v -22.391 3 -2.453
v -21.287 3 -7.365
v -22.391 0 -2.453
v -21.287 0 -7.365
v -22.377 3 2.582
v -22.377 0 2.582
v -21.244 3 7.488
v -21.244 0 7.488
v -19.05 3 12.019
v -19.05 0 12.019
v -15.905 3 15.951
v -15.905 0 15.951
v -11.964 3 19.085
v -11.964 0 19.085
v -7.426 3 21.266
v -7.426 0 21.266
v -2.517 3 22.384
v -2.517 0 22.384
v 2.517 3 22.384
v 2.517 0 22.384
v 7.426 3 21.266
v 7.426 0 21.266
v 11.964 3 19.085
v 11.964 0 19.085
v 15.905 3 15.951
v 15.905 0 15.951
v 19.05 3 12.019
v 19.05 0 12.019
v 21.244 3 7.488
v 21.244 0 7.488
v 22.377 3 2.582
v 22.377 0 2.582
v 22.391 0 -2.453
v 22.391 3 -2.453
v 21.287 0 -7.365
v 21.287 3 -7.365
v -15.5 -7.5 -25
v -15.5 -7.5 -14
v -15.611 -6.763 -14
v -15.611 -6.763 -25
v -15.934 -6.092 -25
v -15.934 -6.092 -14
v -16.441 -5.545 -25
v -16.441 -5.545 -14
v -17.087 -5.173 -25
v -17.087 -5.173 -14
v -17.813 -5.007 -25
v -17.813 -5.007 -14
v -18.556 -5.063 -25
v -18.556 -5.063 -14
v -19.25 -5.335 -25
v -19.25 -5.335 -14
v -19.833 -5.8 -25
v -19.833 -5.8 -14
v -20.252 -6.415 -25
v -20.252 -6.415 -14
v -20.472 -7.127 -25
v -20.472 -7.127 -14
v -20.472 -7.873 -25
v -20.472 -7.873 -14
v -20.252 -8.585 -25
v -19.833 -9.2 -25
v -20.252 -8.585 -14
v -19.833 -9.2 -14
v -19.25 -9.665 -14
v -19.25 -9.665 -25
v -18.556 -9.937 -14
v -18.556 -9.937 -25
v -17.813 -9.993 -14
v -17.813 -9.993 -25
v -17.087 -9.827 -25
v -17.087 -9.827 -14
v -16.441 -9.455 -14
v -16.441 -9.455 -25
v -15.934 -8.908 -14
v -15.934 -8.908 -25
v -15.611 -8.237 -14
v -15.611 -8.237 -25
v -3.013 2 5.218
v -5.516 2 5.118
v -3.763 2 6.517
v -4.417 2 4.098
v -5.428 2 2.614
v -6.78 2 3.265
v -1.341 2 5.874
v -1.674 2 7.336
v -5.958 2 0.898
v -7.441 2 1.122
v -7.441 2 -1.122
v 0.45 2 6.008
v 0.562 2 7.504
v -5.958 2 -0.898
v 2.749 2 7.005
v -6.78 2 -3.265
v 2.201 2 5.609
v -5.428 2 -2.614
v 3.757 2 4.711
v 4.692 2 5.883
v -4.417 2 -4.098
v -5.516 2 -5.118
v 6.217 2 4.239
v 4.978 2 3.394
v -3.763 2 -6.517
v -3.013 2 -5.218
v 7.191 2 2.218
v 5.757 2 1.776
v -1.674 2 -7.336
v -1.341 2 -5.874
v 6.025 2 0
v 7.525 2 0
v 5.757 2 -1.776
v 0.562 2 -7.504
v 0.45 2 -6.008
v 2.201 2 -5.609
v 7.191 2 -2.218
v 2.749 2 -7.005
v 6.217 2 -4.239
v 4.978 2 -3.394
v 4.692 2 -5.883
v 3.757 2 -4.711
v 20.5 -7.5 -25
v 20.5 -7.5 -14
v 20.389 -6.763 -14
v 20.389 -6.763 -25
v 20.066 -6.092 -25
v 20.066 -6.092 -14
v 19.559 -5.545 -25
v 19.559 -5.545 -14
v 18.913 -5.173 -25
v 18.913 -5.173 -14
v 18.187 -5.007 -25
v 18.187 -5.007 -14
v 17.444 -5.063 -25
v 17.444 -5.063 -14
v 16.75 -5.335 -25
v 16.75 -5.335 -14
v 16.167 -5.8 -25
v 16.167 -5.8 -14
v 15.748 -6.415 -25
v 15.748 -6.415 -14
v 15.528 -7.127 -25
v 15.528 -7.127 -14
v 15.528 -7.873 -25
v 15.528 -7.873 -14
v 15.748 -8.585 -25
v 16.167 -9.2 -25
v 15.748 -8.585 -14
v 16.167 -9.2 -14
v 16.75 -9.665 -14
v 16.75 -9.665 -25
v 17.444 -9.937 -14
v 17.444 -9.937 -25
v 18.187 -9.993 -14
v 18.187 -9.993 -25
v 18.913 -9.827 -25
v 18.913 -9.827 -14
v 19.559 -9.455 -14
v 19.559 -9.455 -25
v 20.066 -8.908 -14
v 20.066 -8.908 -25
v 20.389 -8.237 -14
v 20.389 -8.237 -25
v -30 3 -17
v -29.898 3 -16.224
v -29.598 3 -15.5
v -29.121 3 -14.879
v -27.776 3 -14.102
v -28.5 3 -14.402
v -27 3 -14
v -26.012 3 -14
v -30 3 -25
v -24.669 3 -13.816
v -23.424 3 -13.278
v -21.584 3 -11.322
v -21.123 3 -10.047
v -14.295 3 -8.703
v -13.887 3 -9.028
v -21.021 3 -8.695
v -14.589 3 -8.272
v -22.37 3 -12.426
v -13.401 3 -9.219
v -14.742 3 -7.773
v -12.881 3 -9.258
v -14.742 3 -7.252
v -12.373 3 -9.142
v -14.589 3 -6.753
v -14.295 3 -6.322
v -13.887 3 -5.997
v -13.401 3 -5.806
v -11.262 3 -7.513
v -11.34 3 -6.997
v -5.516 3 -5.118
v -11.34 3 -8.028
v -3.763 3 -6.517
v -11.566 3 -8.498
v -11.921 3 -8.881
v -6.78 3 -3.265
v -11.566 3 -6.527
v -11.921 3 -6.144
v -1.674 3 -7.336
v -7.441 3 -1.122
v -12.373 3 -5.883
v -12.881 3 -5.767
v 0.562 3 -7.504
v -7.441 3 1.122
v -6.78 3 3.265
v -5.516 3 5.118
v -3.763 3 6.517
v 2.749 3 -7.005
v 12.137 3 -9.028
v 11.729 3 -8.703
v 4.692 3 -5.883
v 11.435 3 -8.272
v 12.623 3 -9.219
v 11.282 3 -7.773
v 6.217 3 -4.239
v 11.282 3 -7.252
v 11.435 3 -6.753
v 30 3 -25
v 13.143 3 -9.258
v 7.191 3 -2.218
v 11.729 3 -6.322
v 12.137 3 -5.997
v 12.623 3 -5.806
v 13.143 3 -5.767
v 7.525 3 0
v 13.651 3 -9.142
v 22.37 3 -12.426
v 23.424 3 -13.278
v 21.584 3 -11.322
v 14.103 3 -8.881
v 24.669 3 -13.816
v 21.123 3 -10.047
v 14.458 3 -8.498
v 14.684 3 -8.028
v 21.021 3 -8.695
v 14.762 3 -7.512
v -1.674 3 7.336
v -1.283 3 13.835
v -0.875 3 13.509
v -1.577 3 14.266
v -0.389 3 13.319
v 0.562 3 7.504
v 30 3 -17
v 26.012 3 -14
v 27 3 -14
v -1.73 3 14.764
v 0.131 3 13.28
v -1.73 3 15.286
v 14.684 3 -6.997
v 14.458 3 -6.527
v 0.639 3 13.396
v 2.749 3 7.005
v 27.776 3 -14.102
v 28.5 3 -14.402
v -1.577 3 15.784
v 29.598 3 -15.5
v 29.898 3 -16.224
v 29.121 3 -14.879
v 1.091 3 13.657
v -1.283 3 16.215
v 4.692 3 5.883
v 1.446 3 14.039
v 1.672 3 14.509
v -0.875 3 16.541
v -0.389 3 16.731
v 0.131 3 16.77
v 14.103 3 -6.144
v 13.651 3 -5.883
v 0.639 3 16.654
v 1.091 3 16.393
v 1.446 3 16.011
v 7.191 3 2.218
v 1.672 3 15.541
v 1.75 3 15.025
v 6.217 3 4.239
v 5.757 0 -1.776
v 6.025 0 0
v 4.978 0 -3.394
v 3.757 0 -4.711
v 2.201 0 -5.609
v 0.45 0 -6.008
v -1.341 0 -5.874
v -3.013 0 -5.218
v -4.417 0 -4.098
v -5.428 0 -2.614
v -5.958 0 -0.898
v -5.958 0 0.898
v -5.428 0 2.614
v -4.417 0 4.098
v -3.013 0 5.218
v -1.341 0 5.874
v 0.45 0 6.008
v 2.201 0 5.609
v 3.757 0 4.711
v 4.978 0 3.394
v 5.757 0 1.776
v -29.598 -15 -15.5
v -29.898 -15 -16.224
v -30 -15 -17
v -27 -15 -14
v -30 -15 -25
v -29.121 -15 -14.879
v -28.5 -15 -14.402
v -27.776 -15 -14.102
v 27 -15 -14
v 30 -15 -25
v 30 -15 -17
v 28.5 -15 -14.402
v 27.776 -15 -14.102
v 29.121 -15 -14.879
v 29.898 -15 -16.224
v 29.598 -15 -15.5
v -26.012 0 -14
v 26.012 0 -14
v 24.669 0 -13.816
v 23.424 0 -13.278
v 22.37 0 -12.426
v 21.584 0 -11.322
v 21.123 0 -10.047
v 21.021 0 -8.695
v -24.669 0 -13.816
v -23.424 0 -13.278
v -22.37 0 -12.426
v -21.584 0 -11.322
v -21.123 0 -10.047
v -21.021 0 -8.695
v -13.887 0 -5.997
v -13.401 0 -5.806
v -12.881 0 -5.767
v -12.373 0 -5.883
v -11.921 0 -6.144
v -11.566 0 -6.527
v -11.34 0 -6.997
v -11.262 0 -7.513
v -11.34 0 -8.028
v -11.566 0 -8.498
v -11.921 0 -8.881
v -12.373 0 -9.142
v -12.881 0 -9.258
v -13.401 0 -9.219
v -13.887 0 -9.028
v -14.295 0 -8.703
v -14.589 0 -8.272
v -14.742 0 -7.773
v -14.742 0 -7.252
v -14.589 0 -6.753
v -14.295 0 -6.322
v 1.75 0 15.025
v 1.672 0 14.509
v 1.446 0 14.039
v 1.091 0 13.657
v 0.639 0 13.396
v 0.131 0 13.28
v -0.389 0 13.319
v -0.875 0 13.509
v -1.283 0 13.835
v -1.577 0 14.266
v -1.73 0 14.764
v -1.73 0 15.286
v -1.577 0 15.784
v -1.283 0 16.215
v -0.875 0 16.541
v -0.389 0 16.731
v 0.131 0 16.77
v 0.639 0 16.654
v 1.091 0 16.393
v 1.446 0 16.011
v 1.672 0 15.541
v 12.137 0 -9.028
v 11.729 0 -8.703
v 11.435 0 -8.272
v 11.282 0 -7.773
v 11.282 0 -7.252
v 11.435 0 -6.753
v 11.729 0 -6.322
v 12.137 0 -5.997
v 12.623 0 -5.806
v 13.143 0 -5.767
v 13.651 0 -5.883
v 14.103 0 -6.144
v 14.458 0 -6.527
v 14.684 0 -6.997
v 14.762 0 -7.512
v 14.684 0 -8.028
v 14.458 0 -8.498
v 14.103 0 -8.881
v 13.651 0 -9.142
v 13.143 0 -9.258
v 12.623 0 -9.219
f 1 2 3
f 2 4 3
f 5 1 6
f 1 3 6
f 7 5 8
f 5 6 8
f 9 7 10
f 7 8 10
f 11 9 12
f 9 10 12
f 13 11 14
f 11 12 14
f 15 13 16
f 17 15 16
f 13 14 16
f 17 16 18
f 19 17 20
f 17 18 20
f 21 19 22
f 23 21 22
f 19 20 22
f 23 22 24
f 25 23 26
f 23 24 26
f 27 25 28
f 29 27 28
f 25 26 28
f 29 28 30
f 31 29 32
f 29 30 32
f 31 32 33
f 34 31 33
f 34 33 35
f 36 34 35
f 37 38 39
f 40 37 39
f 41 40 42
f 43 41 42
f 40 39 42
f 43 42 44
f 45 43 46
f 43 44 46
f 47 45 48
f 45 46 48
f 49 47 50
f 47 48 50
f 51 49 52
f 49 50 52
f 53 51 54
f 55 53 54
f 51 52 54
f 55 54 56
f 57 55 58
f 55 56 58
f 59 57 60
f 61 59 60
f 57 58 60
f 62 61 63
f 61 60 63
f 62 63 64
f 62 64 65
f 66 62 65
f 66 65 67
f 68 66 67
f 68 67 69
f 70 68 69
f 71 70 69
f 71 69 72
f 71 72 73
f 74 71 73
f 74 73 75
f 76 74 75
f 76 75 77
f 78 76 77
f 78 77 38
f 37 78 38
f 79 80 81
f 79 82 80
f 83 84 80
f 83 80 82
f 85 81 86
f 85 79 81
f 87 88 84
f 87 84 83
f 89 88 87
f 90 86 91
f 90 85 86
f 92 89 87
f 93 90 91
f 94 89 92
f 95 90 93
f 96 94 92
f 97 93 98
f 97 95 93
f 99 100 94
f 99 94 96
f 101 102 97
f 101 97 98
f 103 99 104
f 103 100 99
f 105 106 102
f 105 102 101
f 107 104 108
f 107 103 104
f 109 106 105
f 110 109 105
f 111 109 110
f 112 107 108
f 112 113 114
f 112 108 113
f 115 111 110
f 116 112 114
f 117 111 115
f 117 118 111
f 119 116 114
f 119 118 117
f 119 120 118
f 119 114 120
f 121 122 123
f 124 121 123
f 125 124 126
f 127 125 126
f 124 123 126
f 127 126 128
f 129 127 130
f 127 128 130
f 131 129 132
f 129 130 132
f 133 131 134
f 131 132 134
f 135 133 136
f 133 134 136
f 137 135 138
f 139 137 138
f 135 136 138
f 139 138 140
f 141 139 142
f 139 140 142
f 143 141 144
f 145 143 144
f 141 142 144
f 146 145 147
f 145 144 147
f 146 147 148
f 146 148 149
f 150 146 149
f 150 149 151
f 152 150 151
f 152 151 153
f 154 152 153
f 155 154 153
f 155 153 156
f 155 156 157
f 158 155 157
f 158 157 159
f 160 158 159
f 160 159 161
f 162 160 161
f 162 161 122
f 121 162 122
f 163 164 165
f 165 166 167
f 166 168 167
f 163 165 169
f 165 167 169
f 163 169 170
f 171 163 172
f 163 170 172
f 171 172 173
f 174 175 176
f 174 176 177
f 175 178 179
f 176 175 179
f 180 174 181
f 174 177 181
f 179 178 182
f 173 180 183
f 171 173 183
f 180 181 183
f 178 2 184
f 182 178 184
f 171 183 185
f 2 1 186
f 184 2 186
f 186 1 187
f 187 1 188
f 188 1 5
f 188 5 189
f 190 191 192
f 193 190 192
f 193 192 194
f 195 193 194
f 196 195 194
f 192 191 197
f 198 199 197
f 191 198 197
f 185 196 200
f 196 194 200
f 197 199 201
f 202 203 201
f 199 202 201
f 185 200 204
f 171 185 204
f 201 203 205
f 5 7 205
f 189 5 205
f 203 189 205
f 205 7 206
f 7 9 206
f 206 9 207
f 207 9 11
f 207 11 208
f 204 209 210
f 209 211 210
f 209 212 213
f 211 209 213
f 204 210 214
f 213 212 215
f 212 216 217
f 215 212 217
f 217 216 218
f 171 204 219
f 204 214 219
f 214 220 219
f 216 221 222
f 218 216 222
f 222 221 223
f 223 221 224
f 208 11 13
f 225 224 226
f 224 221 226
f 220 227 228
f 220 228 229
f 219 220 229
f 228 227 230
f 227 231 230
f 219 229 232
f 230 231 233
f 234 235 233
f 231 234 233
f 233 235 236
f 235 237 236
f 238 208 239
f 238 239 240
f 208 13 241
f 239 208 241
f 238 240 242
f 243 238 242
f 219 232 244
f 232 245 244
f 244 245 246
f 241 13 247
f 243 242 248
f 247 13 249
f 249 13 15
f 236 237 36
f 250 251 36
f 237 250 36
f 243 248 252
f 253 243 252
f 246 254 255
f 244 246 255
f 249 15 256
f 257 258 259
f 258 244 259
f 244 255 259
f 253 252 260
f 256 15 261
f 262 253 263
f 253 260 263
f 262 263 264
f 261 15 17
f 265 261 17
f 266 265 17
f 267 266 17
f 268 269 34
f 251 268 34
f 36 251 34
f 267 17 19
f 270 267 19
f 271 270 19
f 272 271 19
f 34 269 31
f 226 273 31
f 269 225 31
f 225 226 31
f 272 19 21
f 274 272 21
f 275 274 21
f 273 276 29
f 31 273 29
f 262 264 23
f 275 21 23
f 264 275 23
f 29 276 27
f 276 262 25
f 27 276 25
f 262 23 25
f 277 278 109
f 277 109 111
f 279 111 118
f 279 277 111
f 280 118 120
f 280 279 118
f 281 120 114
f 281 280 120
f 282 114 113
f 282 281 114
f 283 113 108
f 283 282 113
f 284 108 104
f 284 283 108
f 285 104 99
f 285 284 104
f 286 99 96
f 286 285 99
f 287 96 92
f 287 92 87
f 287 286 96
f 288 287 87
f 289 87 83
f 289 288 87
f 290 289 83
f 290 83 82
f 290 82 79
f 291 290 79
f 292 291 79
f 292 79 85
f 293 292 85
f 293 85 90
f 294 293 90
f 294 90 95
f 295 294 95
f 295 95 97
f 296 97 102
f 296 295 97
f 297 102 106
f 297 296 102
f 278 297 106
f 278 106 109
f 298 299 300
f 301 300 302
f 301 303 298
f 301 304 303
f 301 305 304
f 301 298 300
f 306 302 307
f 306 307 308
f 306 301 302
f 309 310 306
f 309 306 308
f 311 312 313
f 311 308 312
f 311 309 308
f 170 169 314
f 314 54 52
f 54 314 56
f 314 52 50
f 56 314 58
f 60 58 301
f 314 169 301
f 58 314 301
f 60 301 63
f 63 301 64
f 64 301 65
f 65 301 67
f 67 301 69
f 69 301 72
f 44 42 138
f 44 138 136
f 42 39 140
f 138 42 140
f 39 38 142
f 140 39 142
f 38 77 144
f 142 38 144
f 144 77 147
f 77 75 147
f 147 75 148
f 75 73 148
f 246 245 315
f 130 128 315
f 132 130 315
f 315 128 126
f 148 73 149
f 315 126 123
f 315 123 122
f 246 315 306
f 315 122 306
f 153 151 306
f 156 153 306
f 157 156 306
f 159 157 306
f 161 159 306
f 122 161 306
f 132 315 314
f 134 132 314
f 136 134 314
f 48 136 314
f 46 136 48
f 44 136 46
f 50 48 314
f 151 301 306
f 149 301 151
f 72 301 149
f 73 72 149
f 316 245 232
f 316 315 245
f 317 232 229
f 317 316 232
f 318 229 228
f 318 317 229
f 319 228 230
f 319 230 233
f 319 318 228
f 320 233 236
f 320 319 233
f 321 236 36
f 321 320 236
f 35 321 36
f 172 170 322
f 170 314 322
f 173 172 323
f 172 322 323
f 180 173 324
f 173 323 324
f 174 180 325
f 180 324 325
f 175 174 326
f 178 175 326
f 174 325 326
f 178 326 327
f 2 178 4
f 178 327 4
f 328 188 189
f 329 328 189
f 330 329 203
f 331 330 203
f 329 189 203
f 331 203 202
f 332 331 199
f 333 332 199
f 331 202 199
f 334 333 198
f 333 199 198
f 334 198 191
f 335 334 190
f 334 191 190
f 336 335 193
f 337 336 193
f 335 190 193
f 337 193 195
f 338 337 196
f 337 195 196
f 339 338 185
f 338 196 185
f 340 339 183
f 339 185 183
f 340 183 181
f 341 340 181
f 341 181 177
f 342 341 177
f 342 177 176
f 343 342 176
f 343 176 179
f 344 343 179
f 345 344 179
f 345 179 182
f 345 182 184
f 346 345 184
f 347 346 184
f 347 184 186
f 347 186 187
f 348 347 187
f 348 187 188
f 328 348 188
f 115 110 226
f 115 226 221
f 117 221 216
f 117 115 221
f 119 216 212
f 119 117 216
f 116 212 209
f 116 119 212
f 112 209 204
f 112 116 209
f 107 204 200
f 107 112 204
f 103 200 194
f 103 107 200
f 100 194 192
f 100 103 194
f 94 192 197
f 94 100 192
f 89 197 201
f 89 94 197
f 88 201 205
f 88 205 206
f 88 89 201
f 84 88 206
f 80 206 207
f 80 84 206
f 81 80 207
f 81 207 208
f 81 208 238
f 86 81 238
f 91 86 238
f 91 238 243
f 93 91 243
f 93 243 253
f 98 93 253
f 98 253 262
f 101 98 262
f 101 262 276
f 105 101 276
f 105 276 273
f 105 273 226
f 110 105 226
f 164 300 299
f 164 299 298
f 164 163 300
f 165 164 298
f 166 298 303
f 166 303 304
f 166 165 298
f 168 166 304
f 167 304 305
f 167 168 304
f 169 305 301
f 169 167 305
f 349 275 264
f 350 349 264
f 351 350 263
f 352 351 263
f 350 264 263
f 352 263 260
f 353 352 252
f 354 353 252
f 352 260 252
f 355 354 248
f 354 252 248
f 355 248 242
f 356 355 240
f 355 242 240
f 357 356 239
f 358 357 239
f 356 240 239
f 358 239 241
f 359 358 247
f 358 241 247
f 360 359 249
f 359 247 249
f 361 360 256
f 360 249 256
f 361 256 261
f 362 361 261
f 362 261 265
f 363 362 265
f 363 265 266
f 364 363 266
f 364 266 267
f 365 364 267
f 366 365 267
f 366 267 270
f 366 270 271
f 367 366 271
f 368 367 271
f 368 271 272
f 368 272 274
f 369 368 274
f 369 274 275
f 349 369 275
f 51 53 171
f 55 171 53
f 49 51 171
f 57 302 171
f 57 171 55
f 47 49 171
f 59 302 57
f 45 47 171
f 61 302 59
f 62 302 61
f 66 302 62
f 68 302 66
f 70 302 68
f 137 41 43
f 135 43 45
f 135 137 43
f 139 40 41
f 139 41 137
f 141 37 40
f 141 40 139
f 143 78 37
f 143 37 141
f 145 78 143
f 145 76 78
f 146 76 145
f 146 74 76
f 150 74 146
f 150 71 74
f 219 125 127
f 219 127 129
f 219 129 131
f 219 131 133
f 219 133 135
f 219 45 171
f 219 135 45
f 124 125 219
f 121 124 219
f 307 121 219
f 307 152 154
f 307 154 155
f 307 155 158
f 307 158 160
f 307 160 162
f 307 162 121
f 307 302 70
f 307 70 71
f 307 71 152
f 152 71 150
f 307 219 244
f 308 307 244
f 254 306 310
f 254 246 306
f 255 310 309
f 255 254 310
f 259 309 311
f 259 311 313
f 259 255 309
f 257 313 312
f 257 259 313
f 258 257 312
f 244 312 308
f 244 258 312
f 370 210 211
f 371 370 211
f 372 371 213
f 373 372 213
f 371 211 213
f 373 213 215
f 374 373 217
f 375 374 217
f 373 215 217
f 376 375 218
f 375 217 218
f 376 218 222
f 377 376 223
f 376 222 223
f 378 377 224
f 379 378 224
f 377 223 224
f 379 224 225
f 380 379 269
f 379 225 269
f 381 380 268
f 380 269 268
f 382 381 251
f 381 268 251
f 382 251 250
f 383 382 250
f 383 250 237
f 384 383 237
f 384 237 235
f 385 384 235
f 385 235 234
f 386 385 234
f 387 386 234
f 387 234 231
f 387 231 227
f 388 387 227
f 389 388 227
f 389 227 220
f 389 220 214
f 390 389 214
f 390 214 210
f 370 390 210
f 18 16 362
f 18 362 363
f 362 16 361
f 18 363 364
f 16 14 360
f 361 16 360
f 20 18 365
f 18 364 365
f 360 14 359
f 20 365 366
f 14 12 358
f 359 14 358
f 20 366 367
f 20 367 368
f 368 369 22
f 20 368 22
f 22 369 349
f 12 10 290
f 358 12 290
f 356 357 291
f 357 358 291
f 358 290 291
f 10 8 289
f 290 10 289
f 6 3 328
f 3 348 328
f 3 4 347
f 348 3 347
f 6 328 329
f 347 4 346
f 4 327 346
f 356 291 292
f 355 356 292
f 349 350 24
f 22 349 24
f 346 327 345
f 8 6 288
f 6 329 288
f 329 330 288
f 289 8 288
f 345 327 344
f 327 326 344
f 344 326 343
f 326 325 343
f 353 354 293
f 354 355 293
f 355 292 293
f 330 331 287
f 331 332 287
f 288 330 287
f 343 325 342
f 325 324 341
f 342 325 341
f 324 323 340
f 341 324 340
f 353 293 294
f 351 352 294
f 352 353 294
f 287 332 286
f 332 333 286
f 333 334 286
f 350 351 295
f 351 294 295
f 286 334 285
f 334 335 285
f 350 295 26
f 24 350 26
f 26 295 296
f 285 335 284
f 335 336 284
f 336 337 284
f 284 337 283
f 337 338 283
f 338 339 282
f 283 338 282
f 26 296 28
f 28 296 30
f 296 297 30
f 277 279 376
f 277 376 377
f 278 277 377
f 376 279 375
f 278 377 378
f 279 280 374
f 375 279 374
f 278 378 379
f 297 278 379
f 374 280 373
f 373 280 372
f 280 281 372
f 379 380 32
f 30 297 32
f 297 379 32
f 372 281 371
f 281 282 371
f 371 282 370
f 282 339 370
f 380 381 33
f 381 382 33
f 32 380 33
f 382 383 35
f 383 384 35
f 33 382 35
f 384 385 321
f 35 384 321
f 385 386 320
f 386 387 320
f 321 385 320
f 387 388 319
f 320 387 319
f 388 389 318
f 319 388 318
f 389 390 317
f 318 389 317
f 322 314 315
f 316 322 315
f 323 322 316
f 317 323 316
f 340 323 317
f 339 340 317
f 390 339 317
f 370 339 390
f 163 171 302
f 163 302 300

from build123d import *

# Parameters (mm, degrees)
SKETCH1_R                = 7.525
SKETCH1_R_2              = 6.025
BOSS_EXTRUDE1_DEPTH      = 2
SKETCH1_5_R              = 22.525
SKETCH1_5_R_2            = 7.525
BOSS_EXTRUDE3_DEPTH      = 3
SKETCH2_R                = 1.75
CUT_EXTRUDE1_DEPTH       = 4.5
CIRPATTERN1_COUNT        = 3
SKETCH9_W                = 60
SKETCH9_H                = 11
BOSS_EXTRUDE7_DEPTH      = 15
BOSS_EXTRUDE7_DEPTH_BACK = 3
CUT_EXTRUDE3_REACH       = 13
SKETCH10_R               = 2.5
FILLET4_R                = 3
FILLET5_R                = 5


with BuildPart() as part:
    # Sketch1 → Boss-Extrude1 (new body)
    with BuildSketch(Plane(origin=(0, 0, 0), x_dir=(1, 0, 0), z_dir=(0, 1, 0))):
        Circle(SKETCH1_R)
        Circle(SKETCH1_R_2, mode=Mode.SUBTRACT)
    extrude(amount=BOSS_EXTRUDE1_DEPTH)

    # Sketch1<5> → Boss-Extrude3 (add)
    with BuildSketch(Plane(origin=(0, 0, 0), x_dir=(1, 0, 0), z_dir=(0, 1, 0))):
        Circle(SKETCH1_5_R)
        Circle(SKETCH1_5_R_2, mode=Mode.SUBTRACT)
    extrude(amount=BOSS_EXTRUDE3_DEPTH)

    # Sketch2 → Cut-Extrude1 (cut)
    with BuildSketch(Plane(origin=(0, 3, 0), x_dir=(1, 0, 0), z_dir=(0, 1, 0))):
        with Locations((0, -15.025)):
            Circle(SKETCH2_R)
    cut_extrude1 = extrude(amount=-CUT_EXTRUDE1_DEPTH, mode=Mode.SUBTRACT)

    # CirPattern1: Cut-Extrude1 ×3 about axis
    cirpattern1_axis = Axis((0, 0, 0), (0, 1, 0))
    for i in range(1, CIRPATTERN1_COUNT):
        add(cut_extrude1.rotate(cirpattern1_axis, i * 360 / CIRPATTERN1_COUNT), mode=Mode.SUBTRACT)

    # Sketch9 → Boss-Extrude7 (add, two sides)
    with BuildSketch(Plane.XZ) as boss_extrude7_sk:
        with Locations((0, -19.5)):
            Rectangle(SKETCH9_W, SKETCH9_H)
    extrude(amount=BOSS_EXTRUDE7_DEPTH)
    extrude(boss_extrude7_sk.sketch, amount=-BOSS_EXTRUDE7_DEPTH_BACK)

    # Sketch10 → Cut-Extrude3 (cut, up to next)
    with BuildSketch(Plane.XY.offset(-14), mode=Mode.PRIVATE) as cut_extrude3_sk1:
        with Locations((-18, -7.5)):
            Circle(SKETCH10_R)
    cut_extrude3_tool1 = extrude(cut_extrude3_sk1.sketch, amount=-CUT_EXTRUDE3_REACH, mode=Mode.PRIVATE) & part.part
    add(cut_extrude3_tool1.solids().sort_by_distance((-18, -7.5, -14))[0], mode=Mode.SUBTRACT)
    # Sketch10 → Cut-Extrude3 (cut, up to next)
    with BuildSketch(Plane.XY.offset(-14), mode=Mode.PRIVATE) as cut_extrude3_sk2:
        with Locations((18, -7.5)):
            Circle(SKETCH10_R)
    cut_extrude3_tool2 = extrude(cut_extrude3_sk2.sketch, amount=-CUT_EXTRUDE3_REACH, mode=Mode.PRIVATE) & part.part
    add(cut_extrude3_tool2.solids().sort_by_distance((18, -7.5, -14))[0], mode=Mode.SUBTRACT)

    # Fillet4
    fillet4_edges = [part.edges().sort_by_distance(p)[0] for p in [
        (-30, -6, -14),
        (30, -6, -14),
    ]]
    fillet(fillet4_edges, radius=FILLET4_R)

    # Fillet5
    fillet5_edges = [part.edges().sort_by_distance(p)[0] for p in [
        (-17.645838745, 1.5, -14),
        (17.645838745, 1.5, -14),
    ]]
    fillet(fillet5_edges, radius=FILLET5_R)


solid = part.part
